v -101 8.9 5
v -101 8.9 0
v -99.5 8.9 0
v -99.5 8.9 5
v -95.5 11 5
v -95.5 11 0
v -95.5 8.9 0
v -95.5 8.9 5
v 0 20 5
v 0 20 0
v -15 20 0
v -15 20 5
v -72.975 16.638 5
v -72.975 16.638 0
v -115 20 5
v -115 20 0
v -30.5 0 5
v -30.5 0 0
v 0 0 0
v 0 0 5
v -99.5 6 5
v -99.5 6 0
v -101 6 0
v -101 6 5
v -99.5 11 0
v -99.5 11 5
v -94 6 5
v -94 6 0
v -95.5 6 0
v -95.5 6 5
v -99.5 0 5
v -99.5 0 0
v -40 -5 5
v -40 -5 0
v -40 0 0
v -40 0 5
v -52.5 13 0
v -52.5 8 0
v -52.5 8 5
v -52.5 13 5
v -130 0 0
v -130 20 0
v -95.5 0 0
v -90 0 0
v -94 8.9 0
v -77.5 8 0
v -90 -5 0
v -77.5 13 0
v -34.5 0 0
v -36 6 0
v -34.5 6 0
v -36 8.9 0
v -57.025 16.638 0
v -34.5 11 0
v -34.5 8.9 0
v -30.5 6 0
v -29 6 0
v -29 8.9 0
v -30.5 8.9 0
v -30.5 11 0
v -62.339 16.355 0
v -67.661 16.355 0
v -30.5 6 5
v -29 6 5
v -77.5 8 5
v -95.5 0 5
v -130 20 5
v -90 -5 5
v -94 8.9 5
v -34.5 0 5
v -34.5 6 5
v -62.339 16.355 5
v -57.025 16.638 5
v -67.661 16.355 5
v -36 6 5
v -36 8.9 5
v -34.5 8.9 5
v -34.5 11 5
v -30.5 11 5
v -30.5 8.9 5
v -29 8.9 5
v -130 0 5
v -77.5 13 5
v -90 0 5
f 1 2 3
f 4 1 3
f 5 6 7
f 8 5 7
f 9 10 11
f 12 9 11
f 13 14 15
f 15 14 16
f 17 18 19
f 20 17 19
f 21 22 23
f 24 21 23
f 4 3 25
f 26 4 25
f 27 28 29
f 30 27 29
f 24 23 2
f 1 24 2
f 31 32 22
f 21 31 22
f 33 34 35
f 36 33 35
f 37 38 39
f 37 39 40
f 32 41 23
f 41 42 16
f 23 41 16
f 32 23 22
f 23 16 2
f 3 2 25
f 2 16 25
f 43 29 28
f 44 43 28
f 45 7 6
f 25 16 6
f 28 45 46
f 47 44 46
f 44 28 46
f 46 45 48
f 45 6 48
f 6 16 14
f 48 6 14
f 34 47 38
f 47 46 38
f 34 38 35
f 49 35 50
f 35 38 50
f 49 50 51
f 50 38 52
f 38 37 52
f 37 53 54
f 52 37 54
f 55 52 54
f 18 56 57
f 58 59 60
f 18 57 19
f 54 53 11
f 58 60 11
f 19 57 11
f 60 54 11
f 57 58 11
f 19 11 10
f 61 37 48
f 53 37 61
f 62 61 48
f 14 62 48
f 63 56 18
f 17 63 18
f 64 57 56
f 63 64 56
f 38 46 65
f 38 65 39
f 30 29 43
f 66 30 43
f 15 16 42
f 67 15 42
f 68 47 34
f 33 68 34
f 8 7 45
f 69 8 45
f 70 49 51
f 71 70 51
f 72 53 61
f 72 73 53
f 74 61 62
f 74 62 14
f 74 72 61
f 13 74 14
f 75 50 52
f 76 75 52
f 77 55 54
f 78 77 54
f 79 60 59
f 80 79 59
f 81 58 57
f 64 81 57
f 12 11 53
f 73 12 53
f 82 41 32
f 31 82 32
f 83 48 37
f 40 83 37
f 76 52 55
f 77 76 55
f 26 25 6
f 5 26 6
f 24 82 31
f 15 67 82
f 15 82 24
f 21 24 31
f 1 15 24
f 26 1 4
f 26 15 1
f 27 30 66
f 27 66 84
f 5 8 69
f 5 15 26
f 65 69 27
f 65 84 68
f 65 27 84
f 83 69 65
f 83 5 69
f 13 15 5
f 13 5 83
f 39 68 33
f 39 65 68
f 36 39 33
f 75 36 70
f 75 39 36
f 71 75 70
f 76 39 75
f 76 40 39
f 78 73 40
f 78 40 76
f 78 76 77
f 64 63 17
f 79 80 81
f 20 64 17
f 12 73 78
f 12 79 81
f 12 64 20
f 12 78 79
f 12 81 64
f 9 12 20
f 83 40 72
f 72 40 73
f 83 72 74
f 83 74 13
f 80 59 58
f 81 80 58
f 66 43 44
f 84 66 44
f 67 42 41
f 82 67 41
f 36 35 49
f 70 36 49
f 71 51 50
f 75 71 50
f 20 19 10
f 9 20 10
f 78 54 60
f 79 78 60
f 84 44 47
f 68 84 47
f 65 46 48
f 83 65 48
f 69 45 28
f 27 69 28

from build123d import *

# Parameters (mm, degrees)
SKETCH_1_W      = 25
SKETCH_1_H      = 5
EXTRUDE_1_DEPTH = 5
FILLET_1_R      = 100


with BuildPart() as part:
    # 草图1 → 凸台-拉伸1 (new body)
    with BuildSketch(Plane.XY):
        Polygon((-40, 0), (-34.5, 0), (-34.5, 6), (-36, 6), (-36, 8.9), (-34.5, 8.9), (-34.5, 11), (-30.5, 11), (-30.5, 8.9), (-29, 8.9), (-29, 6), (-30.5, 6), (-30.5, 0), (0, 0), (0, 20), (-15, 20), (-65, 16), (-115, 20), (-130, 20), (-130, 0), (-99.5, 0), (-99.5, 6), (-101, 6), (-101, 8.9), (-99.5, 8.9), (-99.5, 11), (-95.5, 11), (-95.5, 8.9), (-94, 8.9), (-94, 6), (-95.5, 6), (-95.5, 0), (-90, 0), (-90, -5), (-40, -5), align=None)
        with Locations((-65, 10.5)):
            Rectangle(SKETCH_1_W, SKETCH_1_H, mode=Mode.SUBTRACT)
    extrude(amount=EXTRUDE_1_DEPTH)

    # 圆角1
    fillet_1_edges = [part.edges().sort_by_distance(p)[0] for p in [
        (-65, 16, 2.5),
    ]]
    fillet(fillet_1_edges, radius=FILLET_1_R)


solid = part.part
